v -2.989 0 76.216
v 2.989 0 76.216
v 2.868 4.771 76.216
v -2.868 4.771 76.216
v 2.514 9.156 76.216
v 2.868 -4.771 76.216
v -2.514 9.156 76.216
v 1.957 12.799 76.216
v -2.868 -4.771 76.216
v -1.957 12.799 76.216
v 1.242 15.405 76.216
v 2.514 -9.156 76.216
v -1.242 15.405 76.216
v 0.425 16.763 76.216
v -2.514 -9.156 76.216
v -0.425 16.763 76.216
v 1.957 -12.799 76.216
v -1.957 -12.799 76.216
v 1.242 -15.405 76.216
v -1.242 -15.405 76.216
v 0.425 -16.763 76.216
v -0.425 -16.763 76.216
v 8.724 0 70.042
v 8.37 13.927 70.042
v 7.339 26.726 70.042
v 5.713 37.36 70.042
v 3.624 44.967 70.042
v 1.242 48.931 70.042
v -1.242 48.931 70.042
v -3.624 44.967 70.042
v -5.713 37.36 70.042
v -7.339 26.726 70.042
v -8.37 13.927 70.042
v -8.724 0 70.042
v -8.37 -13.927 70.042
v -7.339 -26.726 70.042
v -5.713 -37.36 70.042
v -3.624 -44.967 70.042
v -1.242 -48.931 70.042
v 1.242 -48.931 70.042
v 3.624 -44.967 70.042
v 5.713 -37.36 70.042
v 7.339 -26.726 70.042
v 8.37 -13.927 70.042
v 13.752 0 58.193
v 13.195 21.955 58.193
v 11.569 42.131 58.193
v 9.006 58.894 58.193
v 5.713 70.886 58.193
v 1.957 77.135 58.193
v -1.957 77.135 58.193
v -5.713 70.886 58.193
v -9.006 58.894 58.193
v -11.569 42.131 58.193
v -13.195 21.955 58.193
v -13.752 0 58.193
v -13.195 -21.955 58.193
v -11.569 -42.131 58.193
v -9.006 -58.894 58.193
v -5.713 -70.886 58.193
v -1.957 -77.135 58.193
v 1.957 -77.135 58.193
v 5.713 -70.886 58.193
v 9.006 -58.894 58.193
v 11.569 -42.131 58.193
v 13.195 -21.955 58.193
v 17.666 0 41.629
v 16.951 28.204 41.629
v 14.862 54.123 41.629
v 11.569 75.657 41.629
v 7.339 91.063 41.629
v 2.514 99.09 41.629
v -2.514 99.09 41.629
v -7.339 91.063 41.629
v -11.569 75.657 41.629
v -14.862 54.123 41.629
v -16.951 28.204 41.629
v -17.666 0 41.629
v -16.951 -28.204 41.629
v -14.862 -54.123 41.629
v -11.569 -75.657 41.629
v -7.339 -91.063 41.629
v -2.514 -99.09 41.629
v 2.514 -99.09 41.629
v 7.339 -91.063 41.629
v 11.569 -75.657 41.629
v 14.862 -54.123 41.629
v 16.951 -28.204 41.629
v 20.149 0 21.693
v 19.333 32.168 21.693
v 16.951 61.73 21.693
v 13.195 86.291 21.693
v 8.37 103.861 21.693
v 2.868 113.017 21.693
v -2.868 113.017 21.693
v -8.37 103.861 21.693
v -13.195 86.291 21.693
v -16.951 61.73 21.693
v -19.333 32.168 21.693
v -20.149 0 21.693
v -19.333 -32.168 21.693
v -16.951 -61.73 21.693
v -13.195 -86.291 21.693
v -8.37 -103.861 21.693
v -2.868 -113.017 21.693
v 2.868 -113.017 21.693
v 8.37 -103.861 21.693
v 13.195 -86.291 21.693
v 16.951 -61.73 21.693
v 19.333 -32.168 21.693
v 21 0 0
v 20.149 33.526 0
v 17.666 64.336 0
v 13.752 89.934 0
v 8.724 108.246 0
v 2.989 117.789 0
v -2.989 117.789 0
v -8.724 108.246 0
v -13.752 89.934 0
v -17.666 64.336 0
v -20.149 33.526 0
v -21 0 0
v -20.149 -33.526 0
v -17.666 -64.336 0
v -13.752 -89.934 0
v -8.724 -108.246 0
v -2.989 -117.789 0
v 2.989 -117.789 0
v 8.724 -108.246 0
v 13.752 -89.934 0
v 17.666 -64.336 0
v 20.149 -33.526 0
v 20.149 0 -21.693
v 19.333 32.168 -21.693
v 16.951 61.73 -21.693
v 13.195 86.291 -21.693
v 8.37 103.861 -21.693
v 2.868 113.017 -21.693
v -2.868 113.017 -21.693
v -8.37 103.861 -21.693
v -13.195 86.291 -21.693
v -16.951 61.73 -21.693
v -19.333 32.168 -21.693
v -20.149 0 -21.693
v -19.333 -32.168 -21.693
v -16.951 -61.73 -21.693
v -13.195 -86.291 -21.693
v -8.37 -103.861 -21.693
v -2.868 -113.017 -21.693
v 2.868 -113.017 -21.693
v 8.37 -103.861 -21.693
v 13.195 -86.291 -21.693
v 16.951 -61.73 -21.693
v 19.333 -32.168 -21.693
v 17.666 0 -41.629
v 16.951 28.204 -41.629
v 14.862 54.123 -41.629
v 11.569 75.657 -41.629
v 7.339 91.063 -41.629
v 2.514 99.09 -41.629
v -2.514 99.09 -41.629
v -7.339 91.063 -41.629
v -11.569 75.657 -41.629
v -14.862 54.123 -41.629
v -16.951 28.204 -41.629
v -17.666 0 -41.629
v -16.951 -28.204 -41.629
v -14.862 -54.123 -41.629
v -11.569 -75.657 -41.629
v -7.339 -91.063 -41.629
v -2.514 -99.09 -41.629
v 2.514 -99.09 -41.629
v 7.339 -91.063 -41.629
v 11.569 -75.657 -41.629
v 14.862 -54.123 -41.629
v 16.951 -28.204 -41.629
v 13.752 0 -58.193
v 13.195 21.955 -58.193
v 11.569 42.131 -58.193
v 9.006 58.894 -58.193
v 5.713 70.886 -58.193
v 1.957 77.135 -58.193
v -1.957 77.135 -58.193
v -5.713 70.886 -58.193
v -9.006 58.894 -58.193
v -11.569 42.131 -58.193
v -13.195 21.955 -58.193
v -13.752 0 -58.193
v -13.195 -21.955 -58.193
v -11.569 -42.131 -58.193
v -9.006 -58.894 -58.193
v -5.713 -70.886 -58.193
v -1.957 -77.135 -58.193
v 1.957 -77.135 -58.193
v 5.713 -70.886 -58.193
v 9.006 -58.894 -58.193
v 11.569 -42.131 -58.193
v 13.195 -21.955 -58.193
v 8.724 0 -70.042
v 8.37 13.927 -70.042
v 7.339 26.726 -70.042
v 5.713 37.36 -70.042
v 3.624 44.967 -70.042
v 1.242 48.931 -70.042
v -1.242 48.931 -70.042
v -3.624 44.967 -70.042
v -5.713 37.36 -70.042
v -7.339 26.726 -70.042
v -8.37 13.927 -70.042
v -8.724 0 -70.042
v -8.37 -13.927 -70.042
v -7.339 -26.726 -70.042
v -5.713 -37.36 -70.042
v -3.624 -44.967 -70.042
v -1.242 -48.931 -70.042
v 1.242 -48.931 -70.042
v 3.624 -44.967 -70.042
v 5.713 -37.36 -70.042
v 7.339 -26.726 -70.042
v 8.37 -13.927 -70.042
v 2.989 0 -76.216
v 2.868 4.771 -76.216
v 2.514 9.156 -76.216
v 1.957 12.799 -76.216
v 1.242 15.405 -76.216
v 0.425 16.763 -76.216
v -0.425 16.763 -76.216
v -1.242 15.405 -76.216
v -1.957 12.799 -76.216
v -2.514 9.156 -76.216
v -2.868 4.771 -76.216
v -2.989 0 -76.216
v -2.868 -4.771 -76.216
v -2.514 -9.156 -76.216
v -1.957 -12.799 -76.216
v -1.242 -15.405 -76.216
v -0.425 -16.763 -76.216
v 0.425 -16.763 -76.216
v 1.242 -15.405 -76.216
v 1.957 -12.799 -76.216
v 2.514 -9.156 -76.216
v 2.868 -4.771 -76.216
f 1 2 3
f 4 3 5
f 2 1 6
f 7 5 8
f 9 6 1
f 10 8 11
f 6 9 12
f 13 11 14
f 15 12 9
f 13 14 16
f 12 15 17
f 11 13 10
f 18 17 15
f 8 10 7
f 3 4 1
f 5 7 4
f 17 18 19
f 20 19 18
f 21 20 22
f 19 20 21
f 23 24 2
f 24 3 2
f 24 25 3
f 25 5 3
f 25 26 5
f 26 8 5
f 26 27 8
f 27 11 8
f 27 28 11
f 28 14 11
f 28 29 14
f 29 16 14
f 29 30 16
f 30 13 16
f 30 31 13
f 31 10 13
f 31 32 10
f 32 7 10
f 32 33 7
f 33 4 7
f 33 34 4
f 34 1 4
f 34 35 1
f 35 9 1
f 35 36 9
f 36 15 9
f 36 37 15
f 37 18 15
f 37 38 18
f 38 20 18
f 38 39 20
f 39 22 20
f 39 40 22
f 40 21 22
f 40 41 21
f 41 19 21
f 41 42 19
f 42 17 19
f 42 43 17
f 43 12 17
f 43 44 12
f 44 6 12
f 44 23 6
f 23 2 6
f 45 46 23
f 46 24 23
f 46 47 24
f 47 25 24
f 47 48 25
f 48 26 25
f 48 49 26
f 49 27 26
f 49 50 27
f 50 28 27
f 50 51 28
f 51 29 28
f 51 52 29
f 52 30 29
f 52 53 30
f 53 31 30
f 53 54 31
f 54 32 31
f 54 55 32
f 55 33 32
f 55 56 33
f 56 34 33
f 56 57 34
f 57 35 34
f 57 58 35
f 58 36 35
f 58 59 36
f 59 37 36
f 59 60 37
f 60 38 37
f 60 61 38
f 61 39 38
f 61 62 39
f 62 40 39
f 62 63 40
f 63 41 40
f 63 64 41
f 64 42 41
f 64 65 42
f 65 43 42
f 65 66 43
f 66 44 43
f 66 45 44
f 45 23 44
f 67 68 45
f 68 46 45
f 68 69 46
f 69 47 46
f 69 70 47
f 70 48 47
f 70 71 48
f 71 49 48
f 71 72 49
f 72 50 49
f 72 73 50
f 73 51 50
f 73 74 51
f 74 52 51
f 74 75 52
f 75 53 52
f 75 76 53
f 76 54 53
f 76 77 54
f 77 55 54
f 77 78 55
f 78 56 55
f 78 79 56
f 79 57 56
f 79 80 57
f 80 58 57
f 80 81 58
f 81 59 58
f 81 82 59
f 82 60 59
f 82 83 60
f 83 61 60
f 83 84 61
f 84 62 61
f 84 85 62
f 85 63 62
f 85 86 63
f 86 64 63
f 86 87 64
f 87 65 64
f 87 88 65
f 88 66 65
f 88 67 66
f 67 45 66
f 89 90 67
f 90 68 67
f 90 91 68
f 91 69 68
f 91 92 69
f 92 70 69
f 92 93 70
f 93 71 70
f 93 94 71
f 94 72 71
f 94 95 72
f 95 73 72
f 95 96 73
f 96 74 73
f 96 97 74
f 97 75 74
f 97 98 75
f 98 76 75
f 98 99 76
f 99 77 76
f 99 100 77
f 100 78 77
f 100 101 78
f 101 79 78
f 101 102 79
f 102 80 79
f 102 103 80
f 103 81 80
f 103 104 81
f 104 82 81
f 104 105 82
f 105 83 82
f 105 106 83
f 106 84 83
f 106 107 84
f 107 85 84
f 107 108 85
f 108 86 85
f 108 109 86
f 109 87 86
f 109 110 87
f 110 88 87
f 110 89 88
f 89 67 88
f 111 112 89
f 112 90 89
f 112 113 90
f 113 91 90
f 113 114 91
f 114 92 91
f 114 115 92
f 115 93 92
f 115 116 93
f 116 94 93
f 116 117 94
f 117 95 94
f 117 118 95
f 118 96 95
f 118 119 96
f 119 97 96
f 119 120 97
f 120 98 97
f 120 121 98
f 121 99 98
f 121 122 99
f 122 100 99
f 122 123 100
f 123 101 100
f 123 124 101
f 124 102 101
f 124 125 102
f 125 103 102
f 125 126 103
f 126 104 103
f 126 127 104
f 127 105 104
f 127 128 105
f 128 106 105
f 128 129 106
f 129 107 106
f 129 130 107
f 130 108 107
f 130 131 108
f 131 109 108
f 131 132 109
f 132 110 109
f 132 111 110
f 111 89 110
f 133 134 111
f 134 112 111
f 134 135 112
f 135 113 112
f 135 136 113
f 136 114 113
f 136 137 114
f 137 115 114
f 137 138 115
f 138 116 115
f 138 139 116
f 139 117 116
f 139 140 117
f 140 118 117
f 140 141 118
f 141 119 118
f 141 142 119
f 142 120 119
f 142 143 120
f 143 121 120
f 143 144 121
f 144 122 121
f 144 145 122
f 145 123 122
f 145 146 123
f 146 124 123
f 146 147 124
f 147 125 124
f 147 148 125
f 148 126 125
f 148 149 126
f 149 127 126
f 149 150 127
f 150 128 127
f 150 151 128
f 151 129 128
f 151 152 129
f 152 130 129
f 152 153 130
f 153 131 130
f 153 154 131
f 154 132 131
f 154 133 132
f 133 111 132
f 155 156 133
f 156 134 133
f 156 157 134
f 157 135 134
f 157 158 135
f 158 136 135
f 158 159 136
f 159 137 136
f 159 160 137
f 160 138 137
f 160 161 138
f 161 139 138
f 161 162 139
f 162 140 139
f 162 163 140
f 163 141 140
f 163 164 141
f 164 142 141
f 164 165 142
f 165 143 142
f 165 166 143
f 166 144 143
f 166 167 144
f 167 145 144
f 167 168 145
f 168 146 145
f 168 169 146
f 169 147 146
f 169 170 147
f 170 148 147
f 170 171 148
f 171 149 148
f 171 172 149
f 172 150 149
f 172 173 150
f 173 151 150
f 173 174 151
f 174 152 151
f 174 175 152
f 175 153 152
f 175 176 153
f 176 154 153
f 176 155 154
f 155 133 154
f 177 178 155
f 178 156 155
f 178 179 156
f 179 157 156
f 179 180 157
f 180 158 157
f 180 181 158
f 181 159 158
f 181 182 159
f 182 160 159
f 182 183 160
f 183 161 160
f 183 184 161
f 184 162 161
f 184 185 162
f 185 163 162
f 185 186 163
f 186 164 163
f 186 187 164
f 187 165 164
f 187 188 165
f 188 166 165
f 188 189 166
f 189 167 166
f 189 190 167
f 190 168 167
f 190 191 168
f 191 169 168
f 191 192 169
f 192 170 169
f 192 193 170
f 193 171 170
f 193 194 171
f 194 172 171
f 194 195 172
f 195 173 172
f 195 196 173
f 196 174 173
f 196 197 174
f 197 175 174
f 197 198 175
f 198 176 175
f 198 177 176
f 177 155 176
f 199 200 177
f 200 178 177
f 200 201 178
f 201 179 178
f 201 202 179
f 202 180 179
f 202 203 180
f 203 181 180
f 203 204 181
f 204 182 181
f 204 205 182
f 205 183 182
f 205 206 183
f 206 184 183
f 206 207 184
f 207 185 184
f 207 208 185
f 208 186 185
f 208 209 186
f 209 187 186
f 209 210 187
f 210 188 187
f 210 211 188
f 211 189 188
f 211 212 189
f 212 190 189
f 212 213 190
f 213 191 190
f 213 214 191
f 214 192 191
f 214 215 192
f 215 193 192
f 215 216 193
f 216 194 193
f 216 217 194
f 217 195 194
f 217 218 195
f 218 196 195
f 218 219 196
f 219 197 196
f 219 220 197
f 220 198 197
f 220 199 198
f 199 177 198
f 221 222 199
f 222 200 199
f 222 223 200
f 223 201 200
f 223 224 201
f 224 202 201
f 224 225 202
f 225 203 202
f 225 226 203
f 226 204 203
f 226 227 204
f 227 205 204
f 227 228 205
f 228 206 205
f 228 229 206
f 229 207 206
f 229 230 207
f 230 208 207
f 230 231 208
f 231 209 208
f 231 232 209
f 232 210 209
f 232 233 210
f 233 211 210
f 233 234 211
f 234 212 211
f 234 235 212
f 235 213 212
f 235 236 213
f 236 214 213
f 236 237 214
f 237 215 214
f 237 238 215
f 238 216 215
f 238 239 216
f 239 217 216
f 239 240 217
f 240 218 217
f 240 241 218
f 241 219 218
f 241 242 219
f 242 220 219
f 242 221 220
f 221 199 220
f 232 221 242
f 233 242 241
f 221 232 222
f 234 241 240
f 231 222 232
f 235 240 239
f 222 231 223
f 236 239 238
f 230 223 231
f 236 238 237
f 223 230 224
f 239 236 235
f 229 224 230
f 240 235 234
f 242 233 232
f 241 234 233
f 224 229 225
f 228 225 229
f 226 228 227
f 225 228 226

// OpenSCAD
// Generated by SolidPython 1.0.1 on 2020-07-29 00:46:46


scale(v = [3, 17, 11]) {
	sphere(r = 7);
}
/***********************************************
*********      SolidPython code:      **********
************************************************
 
# import packages: SolidPython
from solid import *
from solid.utils import *
from itertools import chain, combinations, permutations


class Resize:

    def __init__(self, scad_file):
        self.scad_file = scad_file
        #self.scad_file = import_scad(scad_file)
        # cone/cylinder param:
        self.r1 = 0
        self.r2 = 0
        self.h = 0
        # rectangular prism param:
        self.w = 0
        self.l = 0
        # ellipse param:
        self.r = 0

    # import OpenScad code (file name corresponds to shape)


    # classify shape + parameters
    def assign(self, param1, param2, param3):
        if self.scad_file == 'cone.scad':
            self.r1 = param1
            self.r2 = param2
            self.h = param3
        elif self.scad_file == 'cylinder.scad':
            self.r1 = param1
            self.r2 = param2
            self.h = param3
        elif self.scad_file == 'rectangularPrism.scad':
            self.h = param1
            self.l = param2
            self.w = param3
        else:
            self.r = param1
            self.h = param2

    # resize parameters
    def iterate(self):
        x = range(3, 20, 2)
        i = 1
        if self.scad_file == 'cone.scad':
            tempList = list(permutations(x, 2))
            for temp in tempList:
                param1 = temp[0]
                param2 = temp[1]
                filepath = 'produced_scad_files/' + 'cone' + str(param1) + '_' + str(param2) + '_' + '.scad'
                scad_render_to_file(cylinder(h=param1, r1=param2, r2=0), filepath)

        elif self.scad_file == 'cylinder.scad':
            tempList = list(permutations(x, 3))
            for temp in tempList:
                param1 = temp[0]
                param2 = temp[1]
                filepath = 'produced_scad_files/' + 'cylinder' + str(param1) + '_' + str(param2) + '_' + '.scad'
                scad_render_to_file(cylinder(h=param1, r1=param2, r2=param2), filepath)

        elif self.scad_file == 'rectangularPrism.scad':
            tempList = list(permutations(x, 3))
            for temp in tempList:
                param1 = temp[0]
                param2 = temp[1]
                param3 = temp[2]
                filepath = 'produced_scad_files/' + 'rectangularPrism' + str(param1) + '_' + str(param2) + '_' + str(
                    param3) + '.scad'
                scad_render_to_file(cube(size=(param1, param2, param3)), filepath)

        elif self.scad_file == 'ellipse.scad':
            tempList = list(permutations(x, 4))
            for temp in tempList:
                param1 = temp[0]
                param2 = temp[1]
                param3 = temp[2]
                param4 = temp[3]
                filepath = 'produced_scad_files/' + 'ellipse' + str(param1) + '_' + str(param2) + '_' + str(param3) + '_' + str(param4) + '.scad'
                scad_render_to_file(scale([param1, param2, param3])(sphere(r=param4)), filepath)

    def render_to_scadfile(self):
        scad_render_to_file(scad, 'example.scad') 
 
************************************************/
